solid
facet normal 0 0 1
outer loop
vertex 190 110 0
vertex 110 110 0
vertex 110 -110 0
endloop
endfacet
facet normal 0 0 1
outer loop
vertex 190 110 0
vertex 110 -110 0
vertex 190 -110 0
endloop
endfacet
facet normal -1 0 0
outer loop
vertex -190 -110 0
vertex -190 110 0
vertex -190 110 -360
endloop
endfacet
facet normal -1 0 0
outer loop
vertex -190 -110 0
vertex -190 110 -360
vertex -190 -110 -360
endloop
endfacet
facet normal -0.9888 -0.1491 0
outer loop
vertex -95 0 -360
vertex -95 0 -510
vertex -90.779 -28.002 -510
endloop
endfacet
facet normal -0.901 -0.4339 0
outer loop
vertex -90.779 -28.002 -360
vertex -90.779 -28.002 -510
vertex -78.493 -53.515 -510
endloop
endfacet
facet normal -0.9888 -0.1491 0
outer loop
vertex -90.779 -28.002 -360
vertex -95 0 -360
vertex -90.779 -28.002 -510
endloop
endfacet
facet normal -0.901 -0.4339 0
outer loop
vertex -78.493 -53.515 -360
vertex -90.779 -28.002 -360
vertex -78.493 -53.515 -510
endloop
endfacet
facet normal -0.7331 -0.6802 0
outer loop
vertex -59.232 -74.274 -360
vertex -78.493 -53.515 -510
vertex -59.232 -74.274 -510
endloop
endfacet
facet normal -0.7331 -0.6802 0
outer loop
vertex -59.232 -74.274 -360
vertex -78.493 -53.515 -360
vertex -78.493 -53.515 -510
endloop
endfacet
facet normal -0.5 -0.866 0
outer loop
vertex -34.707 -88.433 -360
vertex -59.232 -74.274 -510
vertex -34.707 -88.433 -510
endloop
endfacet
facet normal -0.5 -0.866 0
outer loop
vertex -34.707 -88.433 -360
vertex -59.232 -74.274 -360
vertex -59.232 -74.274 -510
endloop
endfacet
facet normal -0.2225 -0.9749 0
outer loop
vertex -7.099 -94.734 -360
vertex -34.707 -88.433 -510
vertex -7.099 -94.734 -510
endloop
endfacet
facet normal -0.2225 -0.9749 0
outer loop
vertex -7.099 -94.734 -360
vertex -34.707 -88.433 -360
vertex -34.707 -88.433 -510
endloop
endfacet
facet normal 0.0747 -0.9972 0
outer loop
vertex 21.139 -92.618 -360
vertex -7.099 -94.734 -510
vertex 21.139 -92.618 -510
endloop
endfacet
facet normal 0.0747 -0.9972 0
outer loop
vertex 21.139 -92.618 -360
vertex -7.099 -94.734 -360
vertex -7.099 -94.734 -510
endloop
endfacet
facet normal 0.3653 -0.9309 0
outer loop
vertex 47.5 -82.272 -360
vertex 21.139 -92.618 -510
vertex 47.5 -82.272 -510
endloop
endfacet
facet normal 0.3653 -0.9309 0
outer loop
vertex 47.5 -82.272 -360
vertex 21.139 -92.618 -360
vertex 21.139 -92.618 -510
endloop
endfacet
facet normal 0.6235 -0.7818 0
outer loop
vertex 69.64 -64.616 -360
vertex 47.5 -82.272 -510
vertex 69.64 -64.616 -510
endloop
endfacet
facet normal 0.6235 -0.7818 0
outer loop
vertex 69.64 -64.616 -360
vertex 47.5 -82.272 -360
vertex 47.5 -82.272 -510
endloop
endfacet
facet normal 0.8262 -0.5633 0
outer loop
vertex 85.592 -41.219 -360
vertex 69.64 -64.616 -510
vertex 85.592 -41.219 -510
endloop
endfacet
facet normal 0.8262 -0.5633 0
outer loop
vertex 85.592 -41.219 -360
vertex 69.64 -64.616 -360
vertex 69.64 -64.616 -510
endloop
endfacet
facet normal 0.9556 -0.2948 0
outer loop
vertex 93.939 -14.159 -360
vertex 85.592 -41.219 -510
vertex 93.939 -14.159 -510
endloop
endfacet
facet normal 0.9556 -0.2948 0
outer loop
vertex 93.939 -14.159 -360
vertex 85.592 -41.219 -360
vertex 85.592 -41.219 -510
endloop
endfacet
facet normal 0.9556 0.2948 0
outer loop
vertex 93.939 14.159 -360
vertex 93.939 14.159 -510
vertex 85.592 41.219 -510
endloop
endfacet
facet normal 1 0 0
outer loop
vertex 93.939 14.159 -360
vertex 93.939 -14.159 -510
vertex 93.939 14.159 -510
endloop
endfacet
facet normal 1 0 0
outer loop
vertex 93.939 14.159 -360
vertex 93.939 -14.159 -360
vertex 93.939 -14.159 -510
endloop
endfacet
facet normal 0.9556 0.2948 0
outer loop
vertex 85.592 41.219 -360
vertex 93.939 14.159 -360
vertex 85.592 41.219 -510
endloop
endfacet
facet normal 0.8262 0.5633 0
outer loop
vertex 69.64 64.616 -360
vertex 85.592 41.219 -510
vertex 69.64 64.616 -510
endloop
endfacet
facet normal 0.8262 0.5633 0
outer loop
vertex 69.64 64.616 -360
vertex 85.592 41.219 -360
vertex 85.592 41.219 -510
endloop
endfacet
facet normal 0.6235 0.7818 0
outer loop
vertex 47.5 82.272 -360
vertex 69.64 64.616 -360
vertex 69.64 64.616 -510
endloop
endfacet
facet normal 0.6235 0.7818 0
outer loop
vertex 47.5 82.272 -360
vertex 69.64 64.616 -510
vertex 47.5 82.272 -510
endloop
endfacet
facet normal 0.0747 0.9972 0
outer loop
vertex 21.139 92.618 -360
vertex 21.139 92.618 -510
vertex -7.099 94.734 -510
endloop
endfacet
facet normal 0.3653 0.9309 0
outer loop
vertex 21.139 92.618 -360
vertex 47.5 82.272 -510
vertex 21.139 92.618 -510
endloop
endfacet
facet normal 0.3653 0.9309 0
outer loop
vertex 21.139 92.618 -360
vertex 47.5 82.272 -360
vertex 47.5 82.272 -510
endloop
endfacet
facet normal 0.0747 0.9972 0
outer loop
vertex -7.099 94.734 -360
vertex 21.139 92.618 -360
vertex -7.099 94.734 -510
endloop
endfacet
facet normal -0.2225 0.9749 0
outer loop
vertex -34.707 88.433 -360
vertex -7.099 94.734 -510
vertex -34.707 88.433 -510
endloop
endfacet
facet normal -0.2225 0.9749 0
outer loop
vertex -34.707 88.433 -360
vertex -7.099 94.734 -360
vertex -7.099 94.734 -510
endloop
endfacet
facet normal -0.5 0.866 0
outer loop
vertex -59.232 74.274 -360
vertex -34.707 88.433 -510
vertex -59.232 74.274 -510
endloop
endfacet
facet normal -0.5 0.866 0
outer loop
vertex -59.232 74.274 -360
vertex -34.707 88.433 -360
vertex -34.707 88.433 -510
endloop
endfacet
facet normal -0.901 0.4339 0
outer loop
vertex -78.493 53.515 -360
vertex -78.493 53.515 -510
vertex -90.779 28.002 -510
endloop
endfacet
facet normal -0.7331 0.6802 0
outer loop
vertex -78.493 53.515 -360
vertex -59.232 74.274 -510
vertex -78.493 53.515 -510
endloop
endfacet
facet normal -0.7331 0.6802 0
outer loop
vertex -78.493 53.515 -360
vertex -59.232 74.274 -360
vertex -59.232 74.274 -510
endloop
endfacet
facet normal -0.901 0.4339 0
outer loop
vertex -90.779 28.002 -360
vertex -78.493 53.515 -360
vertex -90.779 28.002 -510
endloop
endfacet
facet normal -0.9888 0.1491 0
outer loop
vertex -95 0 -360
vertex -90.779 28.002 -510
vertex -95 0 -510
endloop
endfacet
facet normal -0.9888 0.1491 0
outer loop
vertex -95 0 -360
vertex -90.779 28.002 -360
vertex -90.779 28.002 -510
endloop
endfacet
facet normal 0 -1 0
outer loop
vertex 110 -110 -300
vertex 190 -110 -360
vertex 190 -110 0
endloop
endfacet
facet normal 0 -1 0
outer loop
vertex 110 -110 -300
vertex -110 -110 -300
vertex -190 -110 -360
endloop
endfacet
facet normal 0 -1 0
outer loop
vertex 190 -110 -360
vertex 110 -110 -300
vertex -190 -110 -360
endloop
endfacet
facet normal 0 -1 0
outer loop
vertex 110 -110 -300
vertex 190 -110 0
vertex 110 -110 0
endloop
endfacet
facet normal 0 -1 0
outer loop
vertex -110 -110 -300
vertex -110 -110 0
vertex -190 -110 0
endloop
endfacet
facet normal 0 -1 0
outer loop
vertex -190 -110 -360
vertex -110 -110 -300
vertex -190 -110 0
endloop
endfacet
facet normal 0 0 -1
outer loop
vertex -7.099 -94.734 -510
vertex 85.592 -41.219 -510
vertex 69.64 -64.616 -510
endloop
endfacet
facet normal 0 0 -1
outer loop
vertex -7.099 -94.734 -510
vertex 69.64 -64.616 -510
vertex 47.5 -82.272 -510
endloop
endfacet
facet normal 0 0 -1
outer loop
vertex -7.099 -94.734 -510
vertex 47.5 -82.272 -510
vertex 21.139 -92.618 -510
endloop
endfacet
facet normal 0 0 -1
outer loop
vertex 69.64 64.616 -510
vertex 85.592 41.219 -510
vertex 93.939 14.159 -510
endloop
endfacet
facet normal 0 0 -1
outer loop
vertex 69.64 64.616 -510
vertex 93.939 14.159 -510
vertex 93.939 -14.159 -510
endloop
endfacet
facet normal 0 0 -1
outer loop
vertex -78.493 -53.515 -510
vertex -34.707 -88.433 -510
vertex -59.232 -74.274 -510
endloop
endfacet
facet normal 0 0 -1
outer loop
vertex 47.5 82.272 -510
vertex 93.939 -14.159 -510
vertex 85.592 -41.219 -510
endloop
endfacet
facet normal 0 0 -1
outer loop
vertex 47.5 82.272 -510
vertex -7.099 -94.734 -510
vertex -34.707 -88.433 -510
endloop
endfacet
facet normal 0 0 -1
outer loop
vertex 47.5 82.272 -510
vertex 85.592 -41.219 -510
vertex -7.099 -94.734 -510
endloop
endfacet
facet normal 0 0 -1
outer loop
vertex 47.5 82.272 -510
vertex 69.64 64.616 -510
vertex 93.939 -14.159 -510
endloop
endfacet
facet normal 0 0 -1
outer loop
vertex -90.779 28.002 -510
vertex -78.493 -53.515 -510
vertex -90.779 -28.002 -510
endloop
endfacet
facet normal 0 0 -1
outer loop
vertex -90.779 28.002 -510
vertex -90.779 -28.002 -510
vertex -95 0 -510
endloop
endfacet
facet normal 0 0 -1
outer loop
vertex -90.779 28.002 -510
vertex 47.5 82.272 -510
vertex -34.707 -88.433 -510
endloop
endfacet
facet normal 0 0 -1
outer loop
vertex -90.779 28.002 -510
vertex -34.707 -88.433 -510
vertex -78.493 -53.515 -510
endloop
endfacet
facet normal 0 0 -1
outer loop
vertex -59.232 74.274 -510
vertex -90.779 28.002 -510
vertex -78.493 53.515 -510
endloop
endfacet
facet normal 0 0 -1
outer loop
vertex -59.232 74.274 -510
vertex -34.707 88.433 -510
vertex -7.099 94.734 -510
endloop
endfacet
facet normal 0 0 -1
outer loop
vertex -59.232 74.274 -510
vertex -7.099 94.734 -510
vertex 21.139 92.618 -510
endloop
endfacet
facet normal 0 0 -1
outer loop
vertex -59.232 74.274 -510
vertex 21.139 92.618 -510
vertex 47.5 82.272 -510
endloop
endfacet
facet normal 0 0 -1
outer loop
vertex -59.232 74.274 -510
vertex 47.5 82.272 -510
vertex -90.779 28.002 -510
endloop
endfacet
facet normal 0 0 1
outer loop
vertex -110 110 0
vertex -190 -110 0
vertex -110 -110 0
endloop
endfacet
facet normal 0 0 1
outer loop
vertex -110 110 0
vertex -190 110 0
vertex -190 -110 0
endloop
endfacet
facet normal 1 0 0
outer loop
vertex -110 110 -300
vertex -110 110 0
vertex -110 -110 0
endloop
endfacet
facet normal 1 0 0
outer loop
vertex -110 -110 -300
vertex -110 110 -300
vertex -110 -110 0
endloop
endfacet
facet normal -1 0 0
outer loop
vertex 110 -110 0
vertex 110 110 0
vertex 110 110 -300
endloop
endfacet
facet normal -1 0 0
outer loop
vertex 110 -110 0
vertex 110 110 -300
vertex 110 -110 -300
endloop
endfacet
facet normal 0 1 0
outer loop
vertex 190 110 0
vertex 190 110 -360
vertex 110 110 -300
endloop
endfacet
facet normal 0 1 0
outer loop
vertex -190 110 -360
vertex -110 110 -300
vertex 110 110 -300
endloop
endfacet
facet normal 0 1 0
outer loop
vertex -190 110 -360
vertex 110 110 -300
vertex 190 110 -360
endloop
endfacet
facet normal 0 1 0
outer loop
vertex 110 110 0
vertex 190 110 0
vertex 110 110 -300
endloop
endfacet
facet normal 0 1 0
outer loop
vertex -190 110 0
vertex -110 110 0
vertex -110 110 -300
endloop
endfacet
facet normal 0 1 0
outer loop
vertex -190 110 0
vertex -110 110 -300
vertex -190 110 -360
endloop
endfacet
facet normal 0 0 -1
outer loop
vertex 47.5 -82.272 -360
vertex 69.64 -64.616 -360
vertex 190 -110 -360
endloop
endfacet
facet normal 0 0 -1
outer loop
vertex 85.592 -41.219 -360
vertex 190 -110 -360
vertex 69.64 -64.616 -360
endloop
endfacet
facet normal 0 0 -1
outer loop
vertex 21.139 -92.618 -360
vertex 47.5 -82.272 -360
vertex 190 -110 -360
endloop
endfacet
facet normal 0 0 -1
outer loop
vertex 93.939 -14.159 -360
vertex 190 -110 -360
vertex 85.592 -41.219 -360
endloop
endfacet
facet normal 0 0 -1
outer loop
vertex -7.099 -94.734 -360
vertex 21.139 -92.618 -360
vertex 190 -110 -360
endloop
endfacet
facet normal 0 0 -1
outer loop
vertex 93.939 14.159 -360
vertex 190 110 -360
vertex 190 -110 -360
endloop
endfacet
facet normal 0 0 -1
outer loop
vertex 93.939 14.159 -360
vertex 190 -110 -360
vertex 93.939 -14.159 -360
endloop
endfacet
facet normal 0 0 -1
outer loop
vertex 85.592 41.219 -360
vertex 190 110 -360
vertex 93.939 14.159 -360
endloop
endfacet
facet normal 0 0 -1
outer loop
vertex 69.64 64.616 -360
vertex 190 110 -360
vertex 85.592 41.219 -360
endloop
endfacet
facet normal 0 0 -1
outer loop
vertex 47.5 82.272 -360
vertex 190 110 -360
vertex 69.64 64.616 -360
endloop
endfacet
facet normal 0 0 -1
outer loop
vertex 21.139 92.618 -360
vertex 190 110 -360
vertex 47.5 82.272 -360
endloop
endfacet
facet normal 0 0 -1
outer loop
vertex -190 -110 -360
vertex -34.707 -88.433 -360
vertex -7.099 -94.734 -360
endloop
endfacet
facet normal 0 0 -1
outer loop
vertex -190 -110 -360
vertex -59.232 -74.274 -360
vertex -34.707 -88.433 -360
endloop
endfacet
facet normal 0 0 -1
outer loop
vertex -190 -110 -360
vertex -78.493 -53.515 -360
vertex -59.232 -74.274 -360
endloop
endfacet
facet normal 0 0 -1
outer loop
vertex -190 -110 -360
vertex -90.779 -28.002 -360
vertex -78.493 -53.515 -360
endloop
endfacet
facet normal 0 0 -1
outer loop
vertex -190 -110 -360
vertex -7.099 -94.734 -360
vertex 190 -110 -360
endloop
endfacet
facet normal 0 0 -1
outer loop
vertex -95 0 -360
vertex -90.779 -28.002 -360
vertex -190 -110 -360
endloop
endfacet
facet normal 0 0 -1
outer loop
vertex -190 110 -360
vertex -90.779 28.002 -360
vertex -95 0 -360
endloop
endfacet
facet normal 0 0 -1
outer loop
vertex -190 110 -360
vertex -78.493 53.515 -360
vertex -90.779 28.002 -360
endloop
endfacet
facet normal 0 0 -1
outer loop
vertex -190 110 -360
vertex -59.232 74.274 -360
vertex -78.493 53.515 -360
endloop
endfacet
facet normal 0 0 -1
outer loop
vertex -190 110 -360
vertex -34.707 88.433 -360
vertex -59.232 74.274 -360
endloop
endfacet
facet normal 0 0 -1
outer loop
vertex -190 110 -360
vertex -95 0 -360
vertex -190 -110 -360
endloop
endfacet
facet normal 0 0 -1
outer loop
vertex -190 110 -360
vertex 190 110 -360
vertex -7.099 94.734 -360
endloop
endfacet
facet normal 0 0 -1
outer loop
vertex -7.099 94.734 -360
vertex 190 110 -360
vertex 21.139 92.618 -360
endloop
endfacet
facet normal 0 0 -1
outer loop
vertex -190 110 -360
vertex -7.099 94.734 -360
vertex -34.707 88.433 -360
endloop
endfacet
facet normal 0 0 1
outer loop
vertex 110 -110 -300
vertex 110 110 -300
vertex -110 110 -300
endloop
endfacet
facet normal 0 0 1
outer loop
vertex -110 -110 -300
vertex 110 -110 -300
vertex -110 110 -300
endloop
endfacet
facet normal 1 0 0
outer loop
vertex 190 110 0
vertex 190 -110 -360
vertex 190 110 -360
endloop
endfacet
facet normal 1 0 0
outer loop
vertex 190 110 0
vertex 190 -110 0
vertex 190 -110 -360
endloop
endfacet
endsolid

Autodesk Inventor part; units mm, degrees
ref_plane "YZ Plane" through (0, 0, 0) normal (1, 0, 0) x (0, 1, 0)
ref_plane "XZ Plane" through (0, 0, 0) normal (0, 1, 0) x (-1, 0, 0)
ref_plane "XY Plane" through (0, 0, 0) normal (0, 0, 1) x (1, 0, 0)
sketch "Sketch1" plane through (0, 0, 0) normal (0, 0, 1) x (1, 0, 0)
  line L0 (-190, 110) -> (-110, 110)
  line L1 (-110, 110) -> (-110, -110)
  line L2 (-110, -110) -> (-190, -110)
  line L3 (-190, -110) -> (-190, 110)
  line L4 (-190, 110) -> (-110, -110) construction
  line L5 (-110, 110) -> (-190, -110) construction
  line L6 (0, 0) -> (0, 2) construction
  line L7 (190, 110) -> (110, 110)
  line L8 (110, 110) -> (110, -110)
  line L9 (110, -110) -> (190, -110)
  line L10 (190, -110) -> (190, 110)
  line L11 (190, 110) -> (110, -110) construction
  line L12 (110, 110) -> (190, -110) construction
  point P0 (-150, 0)
  point P1 (-150, 0)
  point P2 (150, 0)
  point P3 (150, 0)
  dimension "d1" = 150
  dimension "d2" = 80
  dimension "d3" = 220
  dimension "d4" = 2
extrude "Extrusion1" add sketch "Sketch1" against normal blind 300
sketch "Sketch2" plane through (0, 0, -300) normal (0, 0, -1) x (-1, 0, 0)
  line L0 (-110, 110) -> (-190, 110) projected
  line L1 (110, -110) -> (190, -110) projected
  line L2 (-190, 110) -> (190, 110)
  line L3 (190, 110) -> (190, -110)
  line L4 (190, -110) -> (-190, -110)
  line L5 (-190, -110) -> (-190, 110)
  point P0 (0, 0)
extrude "Extrusion2" add sketch "Sketch2" along normal blind 60
sketch "Sketch3" plane through (0, 0, -360) normal (0, 0, -1) x (-1, 0, 0)
  circle A0 centre (0, 0) radius 95
  dimension "d9" = 190
extrude "Extrusion3" add sketch "Sketch3" along normal blind 150
thread "Thread1" size "M190x8" class "6g" standard "ANSI Metric M Profile" full length
equation "\"BendRadius\" = Thickness"
equation "\"BendReliefWidth\" = Thickness"
equation "\"BendReliefDepth\" = 0.5 * Thickness"
equation "\"CornerReliefSize\" = 4 * Thickness"
equation "\"MinimumRemnant\" = 2 * Thickness"
equation "\"TransitionRadius\" = BendRadius"
equation "\"JacobiRadiusSize\" = BendRadius"
equation "\"GapSize\" = Thickness"
equation "\"Thickness\" = 3.048"
properties part number "08_Gripper"
